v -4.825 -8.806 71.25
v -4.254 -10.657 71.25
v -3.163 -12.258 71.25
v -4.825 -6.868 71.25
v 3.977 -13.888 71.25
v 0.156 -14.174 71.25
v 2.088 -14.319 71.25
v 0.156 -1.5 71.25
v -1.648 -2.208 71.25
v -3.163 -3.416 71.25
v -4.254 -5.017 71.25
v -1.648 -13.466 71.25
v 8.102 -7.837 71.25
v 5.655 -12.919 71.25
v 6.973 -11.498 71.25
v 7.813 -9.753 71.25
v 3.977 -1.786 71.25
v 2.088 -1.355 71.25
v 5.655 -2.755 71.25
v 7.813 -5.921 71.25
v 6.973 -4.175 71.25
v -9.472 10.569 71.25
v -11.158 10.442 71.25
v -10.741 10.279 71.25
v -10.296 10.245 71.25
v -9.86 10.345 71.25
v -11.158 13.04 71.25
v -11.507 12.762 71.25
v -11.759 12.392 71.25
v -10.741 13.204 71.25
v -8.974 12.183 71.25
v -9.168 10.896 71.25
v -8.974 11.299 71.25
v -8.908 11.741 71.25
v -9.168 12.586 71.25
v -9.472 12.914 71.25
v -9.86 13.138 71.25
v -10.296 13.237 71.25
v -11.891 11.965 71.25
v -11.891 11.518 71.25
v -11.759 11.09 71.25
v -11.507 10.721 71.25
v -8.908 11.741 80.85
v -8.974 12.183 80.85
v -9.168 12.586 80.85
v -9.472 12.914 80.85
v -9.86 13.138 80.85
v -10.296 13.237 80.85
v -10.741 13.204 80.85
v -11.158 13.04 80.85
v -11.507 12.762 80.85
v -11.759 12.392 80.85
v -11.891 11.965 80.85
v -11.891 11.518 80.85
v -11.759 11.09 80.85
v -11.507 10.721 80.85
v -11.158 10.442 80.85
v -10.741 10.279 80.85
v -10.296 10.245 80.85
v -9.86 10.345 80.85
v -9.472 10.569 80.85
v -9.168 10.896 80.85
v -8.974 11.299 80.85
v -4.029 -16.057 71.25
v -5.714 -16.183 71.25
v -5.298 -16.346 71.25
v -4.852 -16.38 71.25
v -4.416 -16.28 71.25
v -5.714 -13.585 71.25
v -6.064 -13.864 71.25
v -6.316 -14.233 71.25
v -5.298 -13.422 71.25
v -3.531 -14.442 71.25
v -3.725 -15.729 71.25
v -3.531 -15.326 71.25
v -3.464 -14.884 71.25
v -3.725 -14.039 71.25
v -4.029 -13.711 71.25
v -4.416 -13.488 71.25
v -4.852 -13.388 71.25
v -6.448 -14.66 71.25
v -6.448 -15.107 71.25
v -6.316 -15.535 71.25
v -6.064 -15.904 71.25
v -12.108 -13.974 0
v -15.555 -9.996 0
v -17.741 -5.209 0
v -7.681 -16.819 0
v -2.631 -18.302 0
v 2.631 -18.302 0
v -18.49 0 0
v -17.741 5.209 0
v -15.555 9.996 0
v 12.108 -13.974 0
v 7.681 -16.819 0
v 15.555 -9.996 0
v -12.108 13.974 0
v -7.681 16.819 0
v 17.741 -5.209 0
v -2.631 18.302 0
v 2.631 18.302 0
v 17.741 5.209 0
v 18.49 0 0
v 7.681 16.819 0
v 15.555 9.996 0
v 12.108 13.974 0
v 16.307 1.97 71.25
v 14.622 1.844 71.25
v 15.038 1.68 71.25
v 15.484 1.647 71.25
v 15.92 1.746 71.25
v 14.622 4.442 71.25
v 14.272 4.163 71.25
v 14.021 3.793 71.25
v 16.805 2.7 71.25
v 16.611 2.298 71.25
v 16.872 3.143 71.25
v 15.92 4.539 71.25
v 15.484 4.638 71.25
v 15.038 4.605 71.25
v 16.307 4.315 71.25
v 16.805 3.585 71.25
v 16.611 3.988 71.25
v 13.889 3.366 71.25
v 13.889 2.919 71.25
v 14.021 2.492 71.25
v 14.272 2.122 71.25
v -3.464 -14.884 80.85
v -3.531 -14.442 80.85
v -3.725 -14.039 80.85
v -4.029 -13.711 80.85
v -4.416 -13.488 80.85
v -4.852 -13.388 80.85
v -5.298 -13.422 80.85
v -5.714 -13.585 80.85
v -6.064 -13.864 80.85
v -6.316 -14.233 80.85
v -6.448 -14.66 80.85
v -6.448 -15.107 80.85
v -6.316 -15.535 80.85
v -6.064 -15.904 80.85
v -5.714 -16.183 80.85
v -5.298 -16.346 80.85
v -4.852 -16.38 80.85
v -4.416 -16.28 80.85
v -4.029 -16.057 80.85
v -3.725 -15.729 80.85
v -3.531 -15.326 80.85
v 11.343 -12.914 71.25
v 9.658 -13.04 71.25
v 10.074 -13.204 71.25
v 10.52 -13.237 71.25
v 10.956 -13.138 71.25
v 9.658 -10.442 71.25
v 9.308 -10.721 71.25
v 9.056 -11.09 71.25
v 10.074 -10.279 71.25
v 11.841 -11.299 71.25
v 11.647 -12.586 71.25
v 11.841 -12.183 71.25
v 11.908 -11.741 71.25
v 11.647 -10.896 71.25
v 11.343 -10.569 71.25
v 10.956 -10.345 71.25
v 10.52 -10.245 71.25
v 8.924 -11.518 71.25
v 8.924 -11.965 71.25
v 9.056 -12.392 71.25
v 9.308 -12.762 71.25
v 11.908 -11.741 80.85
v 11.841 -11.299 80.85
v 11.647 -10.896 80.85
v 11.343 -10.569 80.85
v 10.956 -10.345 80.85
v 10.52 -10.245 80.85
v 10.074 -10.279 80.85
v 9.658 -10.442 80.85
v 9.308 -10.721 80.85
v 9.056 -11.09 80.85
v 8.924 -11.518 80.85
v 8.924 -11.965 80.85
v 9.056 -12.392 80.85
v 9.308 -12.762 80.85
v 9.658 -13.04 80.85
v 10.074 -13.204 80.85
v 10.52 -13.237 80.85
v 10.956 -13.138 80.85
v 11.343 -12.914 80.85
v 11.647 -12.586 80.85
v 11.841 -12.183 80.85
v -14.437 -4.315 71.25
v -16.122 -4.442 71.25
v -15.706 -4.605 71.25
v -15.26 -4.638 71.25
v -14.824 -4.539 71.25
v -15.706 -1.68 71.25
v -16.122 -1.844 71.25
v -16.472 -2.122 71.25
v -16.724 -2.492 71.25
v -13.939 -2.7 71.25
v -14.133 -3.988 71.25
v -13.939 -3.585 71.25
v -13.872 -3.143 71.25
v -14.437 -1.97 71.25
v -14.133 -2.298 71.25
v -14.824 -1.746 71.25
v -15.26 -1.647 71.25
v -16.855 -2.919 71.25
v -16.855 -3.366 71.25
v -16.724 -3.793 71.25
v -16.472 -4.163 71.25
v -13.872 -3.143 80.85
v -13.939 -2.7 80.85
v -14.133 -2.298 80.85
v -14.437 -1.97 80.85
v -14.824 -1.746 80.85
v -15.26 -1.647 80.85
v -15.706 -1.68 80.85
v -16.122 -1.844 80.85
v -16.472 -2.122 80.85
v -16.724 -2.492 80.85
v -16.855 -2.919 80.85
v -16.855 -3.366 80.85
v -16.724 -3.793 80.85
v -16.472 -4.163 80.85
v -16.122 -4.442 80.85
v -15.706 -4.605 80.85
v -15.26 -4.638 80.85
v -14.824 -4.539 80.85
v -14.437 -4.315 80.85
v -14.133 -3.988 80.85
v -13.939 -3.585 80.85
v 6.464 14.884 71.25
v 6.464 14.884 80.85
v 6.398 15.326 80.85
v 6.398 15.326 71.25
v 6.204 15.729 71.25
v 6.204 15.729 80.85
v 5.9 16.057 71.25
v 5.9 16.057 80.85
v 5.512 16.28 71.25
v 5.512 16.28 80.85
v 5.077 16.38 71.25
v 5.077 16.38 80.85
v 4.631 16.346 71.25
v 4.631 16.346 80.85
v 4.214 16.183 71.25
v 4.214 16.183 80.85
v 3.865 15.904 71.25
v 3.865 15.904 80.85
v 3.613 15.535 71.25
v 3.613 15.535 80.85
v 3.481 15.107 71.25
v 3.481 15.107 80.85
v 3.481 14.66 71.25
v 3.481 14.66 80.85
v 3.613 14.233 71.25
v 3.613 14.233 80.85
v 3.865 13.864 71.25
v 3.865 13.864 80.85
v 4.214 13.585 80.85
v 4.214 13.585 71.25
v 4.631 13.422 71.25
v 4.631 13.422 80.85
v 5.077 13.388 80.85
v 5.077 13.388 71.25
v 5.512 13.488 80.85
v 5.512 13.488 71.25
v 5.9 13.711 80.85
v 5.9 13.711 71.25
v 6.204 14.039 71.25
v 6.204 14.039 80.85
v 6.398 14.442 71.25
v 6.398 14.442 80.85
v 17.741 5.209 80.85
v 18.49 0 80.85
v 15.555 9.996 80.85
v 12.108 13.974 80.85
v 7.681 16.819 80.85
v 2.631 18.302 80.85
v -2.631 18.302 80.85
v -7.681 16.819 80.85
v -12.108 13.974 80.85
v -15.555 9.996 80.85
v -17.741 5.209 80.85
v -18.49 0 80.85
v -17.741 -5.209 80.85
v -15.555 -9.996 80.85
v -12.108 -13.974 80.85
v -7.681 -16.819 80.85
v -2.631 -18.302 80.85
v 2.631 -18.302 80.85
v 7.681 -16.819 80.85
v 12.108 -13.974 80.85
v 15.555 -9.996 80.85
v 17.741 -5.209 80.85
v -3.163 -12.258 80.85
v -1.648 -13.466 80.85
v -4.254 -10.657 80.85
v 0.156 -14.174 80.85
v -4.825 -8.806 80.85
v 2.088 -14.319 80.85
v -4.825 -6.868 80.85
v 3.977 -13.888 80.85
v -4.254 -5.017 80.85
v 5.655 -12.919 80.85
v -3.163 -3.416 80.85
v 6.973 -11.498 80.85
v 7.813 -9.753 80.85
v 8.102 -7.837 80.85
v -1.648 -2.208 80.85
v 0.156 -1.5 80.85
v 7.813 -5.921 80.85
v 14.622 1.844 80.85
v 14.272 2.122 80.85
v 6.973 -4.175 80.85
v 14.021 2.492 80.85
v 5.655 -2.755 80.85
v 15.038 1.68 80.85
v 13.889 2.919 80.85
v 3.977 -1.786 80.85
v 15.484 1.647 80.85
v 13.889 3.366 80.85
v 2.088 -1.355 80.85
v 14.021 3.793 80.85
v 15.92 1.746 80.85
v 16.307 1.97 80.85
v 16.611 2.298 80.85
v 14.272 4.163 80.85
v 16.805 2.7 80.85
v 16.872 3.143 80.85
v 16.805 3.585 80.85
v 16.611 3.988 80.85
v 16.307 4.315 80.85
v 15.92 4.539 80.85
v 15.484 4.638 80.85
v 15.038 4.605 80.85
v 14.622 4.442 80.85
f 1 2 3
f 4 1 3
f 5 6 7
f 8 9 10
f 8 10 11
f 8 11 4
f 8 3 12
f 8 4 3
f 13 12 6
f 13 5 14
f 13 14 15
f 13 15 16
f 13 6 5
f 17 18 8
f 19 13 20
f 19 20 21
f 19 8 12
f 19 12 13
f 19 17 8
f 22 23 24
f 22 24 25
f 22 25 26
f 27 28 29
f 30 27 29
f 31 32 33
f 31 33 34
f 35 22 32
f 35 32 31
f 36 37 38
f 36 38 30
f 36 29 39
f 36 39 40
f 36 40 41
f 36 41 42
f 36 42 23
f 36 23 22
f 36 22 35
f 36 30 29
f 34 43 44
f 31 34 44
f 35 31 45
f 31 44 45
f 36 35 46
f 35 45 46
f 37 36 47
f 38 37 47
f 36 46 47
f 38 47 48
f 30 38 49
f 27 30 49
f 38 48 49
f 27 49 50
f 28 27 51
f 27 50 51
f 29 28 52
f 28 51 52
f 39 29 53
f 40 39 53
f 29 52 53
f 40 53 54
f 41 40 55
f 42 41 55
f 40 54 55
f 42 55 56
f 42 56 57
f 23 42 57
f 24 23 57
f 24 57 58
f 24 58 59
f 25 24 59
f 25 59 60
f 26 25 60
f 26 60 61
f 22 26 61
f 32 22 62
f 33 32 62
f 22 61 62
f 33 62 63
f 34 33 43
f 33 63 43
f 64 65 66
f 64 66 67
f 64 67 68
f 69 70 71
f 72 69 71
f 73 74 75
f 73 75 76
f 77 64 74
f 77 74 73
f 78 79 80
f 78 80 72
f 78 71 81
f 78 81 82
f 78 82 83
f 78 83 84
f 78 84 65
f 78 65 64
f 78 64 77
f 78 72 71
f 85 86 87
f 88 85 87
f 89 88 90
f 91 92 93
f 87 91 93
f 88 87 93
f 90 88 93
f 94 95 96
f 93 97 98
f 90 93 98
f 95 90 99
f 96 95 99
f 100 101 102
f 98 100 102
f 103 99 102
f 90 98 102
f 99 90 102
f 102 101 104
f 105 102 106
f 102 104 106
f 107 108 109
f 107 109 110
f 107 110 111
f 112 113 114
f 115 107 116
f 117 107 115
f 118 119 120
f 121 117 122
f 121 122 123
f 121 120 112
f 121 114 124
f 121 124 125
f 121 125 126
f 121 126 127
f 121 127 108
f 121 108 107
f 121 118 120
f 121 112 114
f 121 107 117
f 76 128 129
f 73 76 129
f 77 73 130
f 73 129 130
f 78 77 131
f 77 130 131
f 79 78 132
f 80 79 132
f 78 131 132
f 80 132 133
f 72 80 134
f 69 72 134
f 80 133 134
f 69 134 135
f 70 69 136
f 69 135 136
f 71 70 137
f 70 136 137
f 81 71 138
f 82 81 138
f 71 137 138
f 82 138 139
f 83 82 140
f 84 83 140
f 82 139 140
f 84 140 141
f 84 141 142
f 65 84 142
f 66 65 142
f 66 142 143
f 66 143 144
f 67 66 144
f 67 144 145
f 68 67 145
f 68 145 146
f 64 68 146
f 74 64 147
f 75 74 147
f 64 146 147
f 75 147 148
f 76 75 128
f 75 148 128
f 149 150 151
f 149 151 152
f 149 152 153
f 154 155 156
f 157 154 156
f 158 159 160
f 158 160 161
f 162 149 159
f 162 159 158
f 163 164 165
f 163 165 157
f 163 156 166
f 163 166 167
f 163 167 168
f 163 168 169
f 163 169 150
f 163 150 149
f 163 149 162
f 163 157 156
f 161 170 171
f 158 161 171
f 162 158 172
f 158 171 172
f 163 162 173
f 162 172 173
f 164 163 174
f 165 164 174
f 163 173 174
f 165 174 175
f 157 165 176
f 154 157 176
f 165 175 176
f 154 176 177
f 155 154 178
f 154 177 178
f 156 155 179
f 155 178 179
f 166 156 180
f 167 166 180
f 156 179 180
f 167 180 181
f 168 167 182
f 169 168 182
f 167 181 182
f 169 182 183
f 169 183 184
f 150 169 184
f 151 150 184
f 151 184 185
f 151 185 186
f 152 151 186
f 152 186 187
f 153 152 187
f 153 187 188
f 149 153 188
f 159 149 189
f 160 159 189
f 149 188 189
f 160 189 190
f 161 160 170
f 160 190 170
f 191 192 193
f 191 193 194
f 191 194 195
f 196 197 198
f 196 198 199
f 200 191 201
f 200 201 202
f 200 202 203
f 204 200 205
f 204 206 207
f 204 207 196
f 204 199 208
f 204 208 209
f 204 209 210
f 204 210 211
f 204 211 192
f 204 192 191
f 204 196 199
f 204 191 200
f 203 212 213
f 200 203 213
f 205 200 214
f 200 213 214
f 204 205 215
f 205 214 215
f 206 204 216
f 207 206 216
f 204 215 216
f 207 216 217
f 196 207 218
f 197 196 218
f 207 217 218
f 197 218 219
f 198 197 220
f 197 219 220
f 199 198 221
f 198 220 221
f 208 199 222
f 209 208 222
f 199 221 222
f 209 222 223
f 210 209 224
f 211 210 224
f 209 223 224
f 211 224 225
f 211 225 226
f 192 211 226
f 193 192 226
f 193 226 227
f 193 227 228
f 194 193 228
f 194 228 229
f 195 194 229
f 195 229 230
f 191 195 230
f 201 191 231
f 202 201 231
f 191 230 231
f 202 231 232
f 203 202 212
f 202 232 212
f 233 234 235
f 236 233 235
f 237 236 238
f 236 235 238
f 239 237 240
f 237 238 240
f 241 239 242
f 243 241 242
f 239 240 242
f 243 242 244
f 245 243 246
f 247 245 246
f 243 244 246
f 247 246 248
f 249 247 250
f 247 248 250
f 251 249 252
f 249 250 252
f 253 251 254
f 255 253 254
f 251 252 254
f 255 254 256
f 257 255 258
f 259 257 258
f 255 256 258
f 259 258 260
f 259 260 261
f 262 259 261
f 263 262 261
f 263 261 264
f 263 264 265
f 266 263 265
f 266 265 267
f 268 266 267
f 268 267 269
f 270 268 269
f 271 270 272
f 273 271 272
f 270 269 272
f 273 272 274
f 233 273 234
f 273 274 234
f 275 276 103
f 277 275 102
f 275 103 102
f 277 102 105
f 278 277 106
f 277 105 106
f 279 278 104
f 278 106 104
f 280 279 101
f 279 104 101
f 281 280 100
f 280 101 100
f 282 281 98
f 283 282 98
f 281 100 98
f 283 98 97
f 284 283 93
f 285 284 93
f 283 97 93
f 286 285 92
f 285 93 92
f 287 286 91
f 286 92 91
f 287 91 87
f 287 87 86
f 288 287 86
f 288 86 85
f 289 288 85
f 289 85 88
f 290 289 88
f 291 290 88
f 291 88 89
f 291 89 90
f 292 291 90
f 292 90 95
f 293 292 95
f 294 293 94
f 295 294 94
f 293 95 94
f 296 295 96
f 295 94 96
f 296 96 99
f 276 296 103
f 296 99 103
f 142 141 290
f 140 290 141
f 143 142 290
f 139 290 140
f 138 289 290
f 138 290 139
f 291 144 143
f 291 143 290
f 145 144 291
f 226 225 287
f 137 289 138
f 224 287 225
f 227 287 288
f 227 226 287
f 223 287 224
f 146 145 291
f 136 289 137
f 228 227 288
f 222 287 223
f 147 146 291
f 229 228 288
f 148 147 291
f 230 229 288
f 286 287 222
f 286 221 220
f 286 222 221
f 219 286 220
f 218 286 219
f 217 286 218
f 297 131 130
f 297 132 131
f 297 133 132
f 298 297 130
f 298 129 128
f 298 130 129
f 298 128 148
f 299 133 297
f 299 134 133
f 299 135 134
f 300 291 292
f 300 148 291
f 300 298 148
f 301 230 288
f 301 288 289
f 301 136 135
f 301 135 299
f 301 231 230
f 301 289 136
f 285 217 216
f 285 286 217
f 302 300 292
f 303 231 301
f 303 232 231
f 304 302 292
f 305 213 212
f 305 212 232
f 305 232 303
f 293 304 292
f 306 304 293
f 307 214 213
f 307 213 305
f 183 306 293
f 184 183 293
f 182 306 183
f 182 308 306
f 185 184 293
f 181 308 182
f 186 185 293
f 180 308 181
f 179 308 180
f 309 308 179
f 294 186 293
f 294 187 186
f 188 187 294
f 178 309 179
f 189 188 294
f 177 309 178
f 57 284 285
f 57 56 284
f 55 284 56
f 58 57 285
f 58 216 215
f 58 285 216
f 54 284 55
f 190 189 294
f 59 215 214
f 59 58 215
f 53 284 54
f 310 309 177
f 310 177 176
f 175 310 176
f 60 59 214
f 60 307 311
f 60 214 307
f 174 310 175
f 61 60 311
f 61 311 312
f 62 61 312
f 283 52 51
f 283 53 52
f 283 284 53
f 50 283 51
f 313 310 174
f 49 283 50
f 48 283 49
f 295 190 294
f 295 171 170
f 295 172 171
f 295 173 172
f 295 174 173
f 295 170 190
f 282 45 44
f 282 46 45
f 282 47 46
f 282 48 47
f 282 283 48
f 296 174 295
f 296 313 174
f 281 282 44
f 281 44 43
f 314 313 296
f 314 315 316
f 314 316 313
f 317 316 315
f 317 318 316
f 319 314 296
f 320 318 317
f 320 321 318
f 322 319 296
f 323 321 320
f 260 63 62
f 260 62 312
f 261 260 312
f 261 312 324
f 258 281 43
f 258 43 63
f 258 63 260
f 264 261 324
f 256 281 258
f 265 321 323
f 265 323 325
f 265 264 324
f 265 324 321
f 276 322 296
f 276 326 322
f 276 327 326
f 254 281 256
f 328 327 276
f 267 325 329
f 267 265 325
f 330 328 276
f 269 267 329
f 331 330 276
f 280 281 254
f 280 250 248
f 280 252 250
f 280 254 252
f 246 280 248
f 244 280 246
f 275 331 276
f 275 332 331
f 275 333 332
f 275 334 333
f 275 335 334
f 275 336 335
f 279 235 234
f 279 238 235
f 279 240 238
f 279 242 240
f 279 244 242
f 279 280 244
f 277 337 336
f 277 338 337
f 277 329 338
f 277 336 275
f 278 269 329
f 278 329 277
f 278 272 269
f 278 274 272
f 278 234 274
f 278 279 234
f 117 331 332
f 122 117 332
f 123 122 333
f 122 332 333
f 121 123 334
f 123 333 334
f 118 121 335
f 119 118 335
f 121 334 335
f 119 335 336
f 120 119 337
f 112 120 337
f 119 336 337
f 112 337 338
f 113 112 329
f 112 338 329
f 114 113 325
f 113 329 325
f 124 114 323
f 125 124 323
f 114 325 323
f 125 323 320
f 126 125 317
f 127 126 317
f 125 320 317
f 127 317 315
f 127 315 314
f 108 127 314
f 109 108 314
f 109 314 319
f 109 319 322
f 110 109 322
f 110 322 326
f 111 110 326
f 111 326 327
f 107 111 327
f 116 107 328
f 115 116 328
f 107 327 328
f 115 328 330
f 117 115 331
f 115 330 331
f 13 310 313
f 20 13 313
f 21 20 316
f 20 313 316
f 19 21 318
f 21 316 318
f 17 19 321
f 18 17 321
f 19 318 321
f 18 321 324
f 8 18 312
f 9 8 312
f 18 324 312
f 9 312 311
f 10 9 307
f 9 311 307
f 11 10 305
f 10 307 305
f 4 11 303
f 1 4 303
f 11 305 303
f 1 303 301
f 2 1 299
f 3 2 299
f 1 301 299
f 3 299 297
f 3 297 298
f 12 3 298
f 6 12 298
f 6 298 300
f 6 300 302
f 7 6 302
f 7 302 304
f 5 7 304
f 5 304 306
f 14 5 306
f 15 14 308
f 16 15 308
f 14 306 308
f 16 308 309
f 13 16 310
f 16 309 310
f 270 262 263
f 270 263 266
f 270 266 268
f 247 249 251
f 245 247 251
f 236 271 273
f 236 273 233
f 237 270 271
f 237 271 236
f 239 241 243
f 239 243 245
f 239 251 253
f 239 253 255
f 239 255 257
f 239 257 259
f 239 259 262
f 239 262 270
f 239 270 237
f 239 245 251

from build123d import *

# Parameters (mm, degrees)
F0_R     = 18.49
F1_DEPTH = 80.85
F2_R     = 1.5
F2_R_2   = 6.5
F3_DEPTH = 9.6


with BuildPart() as f1:
    # F0 (on Top) → F1 (new body)
    with BuildSketch(Plane.XY):
        Circle(F0_R)
    extrude(amount=F1_DEPTH)

    # F2 (on face) → F3 (cut)
    with BuildSketch(Plane.XY.offset(80.85)):
        with Locations((10.407604, -11.74129)):
            Circle(F2_R)
        with Locations((15.372057, 3.142604)):
            Circle(F2_R)
        with Locations((4.964453, 14.883894)):
            Circle(F2_R)
        with Locations((-10.407604, 11.74129)):
            Circle(F2_R)
        with Locations((-15.372057, -3.142604)):
            Circle(F2_R)
        with Locations((-4.964453, -14.883894)):
            Circle(F2_R)
        with Locations((1.602135, -7.836848)):
            Circle(F2_R_2)
    extrude(amount=-F3_DEPTH, mode=Mode.SUBTRACT)


solid = f1.part
